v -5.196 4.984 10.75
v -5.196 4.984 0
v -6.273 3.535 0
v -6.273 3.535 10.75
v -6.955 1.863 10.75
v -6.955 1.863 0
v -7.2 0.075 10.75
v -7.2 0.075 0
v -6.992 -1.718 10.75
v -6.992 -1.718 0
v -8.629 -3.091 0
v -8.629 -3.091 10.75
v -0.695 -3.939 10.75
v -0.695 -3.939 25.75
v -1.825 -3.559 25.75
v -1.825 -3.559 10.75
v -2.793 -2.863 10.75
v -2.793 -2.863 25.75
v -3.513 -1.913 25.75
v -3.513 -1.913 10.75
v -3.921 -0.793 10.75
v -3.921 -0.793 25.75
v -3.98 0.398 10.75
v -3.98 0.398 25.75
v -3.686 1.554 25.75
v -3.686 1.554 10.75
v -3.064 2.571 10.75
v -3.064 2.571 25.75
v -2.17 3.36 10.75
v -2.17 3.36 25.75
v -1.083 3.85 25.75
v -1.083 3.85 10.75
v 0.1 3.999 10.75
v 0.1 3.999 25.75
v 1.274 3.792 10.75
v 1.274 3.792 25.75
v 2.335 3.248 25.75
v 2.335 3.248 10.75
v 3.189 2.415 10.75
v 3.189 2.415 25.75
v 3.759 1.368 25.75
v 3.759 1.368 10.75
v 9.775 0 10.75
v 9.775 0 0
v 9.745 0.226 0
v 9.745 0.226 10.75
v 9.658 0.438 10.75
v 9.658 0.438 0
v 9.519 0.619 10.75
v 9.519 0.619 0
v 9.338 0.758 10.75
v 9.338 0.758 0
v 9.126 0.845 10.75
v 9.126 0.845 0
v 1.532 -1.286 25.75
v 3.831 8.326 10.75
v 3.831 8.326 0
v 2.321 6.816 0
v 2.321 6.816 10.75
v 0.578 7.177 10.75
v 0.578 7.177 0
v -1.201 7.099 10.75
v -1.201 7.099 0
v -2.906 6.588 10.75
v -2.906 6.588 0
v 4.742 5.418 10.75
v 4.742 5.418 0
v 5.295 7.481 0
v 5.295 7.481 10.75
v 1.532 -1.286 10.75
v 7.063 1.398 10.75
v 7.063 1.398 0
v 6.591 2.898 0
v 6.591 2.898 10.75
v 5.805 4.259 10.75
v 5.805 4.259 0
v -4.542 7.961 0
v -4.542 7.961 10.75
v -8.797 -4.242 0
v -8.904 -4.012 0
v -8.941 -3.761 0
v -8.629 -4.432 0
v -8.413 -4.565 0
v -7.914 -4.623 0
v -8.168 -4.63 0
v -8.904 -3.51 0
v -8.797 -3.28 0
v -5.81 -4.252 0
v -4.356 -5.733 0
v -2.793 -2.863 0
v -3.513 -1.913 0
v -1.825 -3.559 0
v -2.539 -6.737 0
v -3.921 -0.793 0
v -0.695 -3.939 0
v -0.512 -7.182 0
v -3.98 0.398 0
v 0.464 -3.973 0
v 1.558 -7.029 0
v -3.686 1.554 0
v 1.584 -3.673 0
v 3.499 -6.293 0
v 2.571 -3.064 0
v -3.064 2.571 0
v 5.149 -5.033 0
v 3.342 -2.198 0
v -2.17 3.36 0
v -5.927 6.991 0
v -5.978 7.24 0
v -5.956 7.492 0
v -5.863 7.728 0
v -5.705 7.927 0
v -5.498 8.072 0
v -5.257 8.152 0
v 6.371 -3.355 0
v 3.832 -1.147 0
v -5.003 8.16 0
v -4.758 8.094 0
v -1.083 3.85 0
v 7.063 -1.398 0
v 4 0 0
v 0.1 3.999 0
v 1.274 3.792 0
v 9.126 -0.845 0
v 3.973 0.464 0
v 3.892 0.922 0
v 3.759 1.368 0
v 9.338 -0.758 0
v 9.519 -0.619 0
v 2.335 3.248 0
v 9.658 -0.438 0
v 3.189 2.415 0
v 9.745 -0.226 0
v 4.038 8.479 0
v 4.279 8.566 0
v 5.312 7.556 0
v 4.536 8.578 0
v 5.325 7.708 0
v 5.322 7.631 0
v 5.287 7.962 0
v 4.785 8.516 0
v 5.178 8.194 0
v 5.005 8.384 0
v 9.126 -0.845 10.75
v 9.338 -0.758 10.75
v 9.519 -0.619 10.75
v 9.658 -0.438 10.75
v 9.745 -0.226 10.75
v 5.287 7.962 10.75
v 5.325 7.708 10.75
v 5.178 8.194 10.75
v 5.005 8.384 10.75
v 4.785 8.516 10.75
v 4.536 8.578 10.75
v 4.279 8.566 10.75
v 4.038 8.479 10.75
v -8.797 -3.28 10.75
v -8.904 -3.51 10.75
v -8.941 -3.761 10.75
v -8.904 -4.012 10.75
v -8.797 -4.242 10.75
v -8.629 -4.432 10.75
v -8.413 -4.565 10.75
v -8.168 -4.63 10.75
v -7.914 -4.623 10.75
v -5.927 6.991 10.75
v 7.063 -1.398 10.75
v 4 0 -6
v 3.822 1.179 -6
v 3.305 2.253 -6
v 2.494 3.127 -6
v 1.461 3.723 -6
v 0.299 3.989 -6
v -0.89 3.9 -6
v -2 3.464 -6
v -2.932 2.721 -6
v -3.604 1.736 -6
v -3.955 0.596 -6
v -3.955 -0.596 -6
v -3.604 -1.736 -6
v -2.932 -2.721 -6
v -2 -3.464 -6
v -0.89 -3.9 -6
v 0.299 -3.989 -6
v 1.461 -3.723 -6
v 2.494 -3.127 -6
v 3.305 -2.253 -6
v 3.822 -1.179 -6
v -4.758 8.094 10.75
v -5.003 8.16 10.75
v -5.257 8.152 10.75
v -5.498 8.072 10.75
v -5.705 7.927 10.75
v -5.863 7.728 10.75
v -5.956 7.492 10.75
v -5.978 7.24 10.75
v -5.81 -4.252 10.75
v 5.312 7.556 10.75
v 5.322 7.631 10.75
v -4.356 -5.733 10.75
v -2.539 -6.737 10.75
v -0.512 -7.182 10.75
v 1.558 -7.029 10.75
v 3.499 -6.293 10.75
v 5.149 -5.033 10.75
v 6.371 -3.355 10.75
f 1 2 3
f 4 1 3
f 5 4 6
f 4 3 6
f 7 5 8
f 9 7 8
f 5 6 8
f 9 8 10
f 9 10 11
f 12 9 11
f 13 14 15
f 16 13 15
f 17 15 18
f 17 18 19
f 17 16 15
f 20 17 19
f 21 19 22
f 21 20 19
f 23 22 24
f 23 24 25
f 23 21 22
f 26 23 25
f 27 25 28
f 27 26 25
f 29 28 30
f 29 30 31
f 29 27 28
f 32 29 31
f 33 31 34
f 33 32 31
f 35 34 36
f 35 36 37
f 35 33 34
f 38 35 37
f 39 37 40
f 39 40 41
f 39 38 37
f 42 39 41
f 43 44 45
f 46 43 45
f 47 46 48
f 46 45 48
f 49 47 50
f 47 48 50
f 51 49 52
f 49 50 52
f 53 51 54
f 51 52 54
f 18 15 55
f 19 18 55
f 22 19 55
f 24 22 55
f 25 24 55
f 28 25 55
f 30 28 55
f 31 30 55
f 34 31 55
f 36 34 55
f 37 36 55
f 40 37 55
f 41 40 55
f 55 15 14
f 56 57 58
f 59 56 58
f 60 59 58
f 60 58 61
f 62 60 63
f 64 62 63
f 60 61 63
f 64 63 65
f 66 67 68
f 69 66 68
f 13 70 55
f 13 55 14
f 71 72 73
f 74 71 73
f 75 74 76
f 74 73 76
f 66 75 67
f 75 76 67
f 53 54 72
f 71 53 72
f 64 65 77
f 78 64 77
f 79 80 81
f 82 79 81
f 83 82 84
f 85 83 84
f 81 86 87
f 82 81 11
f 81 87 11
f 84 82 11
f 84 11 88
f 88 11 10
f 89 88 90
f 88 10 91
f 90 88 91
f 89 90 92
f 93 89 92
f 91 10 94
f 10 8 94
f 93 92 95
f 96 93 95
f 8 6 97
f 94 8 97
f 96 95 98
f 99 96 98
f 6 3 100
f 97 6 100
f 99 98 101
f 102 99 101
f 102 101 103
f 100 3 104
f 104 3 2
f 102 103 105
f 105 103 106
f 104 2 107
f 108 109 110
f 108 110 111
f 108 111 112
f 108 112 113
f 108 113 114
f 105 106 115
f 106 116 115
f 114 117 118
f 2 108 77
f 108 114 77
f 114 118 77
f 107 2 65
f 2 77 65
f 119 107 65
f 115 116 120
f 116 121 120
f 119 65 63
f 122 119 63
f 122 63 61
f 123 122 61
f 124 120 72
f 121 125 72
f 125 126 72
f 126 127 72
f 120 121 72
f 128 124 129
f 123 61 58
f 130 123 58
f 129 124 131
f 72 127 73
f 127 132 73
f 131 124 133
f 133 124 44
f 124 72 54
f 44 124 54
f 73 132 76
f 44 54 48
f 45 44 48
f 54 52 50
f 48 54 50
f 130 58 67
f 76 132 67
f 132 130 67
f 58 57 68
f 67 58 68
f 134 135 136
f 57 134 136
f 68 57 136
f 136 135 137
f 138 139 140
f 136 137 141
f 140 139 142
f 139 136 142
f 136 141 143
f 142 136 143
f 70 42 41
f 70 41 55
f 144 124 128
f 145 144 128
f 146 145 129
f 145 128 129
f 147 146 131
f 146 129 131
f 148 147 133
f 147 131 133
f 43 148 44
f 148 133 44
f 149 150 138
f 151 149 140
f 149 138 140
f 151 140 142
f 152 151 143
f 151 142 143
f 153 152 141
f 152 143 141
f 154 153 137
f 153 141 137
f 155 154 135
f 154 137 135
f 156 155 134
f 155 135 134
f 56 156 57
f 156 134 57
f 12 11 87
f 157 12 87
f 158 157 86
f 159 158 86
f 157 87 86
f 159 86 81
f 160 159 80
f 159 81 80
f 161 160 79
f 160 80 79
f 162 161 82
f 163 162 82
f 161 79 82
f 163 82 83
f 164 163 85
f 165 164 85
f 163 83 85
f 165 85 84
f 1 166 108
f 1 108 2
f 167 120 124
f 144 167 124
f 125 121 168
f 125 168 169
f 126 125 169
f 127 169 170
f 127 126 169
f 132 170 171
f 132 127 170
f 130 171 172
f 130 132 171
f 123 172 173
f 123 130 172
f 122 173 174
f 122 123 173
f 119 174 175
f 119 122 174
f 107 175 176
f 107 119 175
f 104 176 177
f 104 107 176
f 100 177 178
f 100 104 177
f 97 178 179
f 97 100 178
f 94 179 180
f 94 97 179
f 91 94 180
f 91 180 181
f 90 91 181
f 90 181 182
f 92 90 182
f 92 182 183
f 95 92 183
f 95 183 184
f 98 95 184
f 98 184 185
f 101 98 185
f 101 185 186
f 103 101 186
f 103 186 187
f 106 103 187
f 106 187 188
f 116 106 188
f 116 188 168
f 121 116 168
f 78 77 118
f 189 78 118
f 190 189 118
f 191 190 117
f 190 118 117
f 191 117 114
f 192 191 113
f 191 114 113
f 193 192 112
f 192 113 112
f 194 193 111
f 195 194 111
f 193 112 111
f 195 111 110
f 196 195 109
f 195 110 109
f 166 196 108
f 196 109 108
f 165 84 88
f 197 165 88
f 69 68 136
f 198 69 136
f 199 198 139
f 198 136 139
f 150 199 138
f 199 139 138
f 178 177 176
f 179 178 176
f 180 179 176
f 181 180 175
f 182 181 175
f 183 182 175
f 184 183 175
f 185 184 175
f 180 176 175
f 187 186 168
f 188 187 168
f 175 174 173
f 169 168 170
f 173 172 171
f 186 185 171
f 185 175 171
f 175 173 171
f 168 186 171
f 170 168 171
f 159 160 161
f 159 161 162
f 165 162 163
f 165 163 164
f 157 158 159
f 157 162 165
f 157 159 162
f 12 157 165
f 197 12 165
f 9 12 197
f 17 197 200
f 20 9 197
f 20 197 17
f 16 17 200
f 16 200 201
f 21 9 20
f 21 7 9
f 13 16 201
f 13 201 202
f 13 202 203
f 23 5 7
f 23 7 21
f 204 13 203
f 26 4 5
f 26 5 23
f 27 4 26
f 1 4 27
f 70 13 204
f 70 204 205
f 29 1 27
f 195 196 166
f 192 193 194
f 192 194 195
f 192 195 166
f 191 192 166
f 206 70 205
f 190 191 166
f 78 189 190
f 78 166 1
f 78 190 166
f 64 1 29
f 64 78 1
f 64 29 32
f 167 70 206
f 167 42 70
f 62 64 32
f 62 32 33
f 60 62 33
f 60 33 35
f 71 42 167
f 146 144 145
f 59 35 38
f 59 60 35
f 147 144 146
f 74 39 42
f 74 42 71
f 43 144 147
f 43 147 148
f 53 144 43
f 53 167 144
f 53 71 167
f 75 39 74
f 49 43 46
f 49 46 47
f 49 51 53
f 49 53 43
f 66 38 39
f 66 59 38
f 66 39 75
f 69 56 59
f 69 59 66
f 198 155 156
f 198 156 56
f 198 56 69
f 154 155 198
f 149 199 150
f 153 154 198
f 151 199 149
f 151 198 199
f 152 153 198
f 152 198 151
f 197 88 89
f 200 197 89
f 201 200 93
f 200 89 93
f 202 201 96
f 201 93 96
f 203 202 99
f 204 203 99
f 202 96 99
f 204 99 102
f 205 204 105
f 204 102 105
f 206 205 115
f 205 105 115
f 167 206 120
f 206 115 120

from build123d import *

# Parameters (mm, degrees)
F1_DEPTH = 10.75
F2_R     = 4
F3_DEPTH = 16.75
F5_DEPTH = 25.75


with BuildPart() as f1:
    # F0 (on Top) → F1 (new body)
    with BuildSketch(Plane.XY):
        with BuildLine():
            Line((0, 0), (7.2, 0))
            ThreePointArc((7.2, 0), (7.1656564529, 0.7024013095), (7.0629534446, 1.3981017988))
            ThreePointArc((7.0629534446, 1.3981017988), (6.2353829072, 3.6), (4.7422683972, 5.4176462093))
            ThreePointArc((4.7422683972, 5.4176462093), (4.1911256041, 5.8544398682), (3.6, 6.2353829072))
            Line((3.6, 6.2353829072), (0, 0))
        make_face()
        with BuildLine():
            Line((8.025, 0), (7.2, 0))
            ThreePointArc((7.2, 0), (7.1656564529, -0.7024013095), (7.0629534446, -1.3981017988))
            Line((7.0629534446, -1.3981017988), (9.1264666645, -0.845185098))
            ThreePointArc((9.1264666645, -0.845185098), (8.3673337496, -0.6941841728), (8.025, 0))
        make_face()
        with BuildLine():
            ThreePointArc((7.0629534446, -1.3981017988), (7.1656564529, -0.7024013095), (7.2, 0))
            Line((7.2, 0), (0, 0))
            Line((0, 0), (-6.5254160667, -3.0428514845))
            ThreePointArc((-6.5254160667, -3.0428514845), (-6.197442622, -3.6649290508), (-5.8103463543, -4.2520436549))
            ThreePointArc((-5.8103463543, -4.2520436549), (1.5583652204, -7.0293312513), (7.0629534446, -1.3981017988))
        make_face()
        with BuildLine():
            ThreePointArc((7.0629534446, 1.3981017988), (7.1656564529, 0.7024013095), (7.2, 0))
            Line((7.2, 0), (8.025, 0))
            ThreePointArc((8.025, 0), (8.3673337496, 0.6941841728), (9.1264666645, 0.845185098))
            Line((9.1264666645, 0.845185098), (7.0629534446, 1.3981017988))
        make_face()
        with BuildLine():
            Line((-4.1297503417, 5.8978947189), (0, 0))
            Line((0, 0), (3.6, 6.2353829072))
            ThreePointArc((3.6, 6.2353829072), (2.9745308488, 6.5568411777), (2.3206850474, 6.8157480082))
            ThreePointArc((2.3206850474, 6.8157480082), (-0.314059589, 7.1931471954), (-2.9058857202, 6.5875510003))
            ThreePointArc((-2.9058857202, 6.5875510003), (-3.5346782238, 6.272642972), (-4.1297503417, 5.8978947189))
        make_face()
        with BuildLine():
            Line((-6.5254160667, -3.0428514845), (0, 0))
            Line((0, 0), (-4.1297503417, 5.8978947189))
            ThreePointArc((-4.1297503417, 5.8978947189), (-4.6854251609, 5.466881292), (-5.1964016135, 4.9837145054))
            ThreePointArc((-5.1964016135, 4.9837145054), (-6.9546659493, 1.8634971247), (-6.9920730582, -1.7178225601))
            ThreePointArc((-6.9920730582, -1.7178225601), (-6.7911378629, -2.3917454979), (-6.5254160667, -3.0428514845))
        make_face()
        with BuildLine():
            ThreePointArc((9.1264666645, 0.845185098), (8.3673337496, 0.6941841728), (8.025, 0))
            Line((8.025, 0), (8.9, 0))
            Line((8.9, 0), (9.1264666645, 0.845185098))
        make_face()
        with BuildLine():
            Line((8.9, 0), (8.025, 0))
            ThreePointArc((8.025, 0), (8.3673337496, -0.6941841728), (9.1264666645, -0.845185098))
            Line((9.1264666645, -0.845185098), (8.9, 0))
        make_face()
        with BuildLine():
            ThreePointArc((3.6, 6.2353829072), (4.1911256041, 5.8544398682), (4.7422683972, 5.4176462093))
            Line((4.7422683972, 5.4176462093), (5.295185098, 7.4811594292))
            ThreePointArc((5.295185098, 7.4811594292), (4.7848480033, 6.8992315027), (4.0125, 6.9498538654))
            Line((4.0125, 6.9498538654), (3.6, 6.2353829072))
        make_face()
        with BuildLine():
            ThreePointArc((9.775, 0), (9.5941841728, 0.5326662504), (9.1264666645, 0.845185098))
            Line((9.1264666645, 0.845185098), (8.9, 0))
            Line((8.9, 0), (9.1264666645, -0.845185098))
            ThreePointArc((9.1264666645, -0.845185098), (9.5941841728, -0.5326662504), (9.775, 0))
        make_face()
        with BuildLine():
            Line((-7.9141971492, -4.6230093134), (-5.8103463543, -4.2520436549))
            ThreePointArc((-5.8103463543, -4.2520436549), (-6.197442622, -3.6649290508), (-6.5254160667, -3.0428514845))
            Line((-6.5254160667, -3.0428514845), (-7.273119991, -3.3915115505))
            ThreePointArc((-7.273119991, -3.3915115505), (-7.2118802984, -3.5719178673), (-7.1911393046, -3.7613025295))
            ThreePointArc((-7.1911393046, -3.7613025295), (-7.3958504169, -4.323741688), (-7.9141971492, -4.6230093134))
        make_face()
        with BuildLine():
            Line((-7.273119991, -3.3915115505), (-6.5254160667, -3.0428514845))
            ThreePointArc((-6.5254160667, -3.0428514845), (-6.7911378629, -2.3917454979), (-6.9920730582, -1.7178225601))
            Line((-6.9920730582, -1.7178225601), (-8.6285784631, -3.0910136418))
            ThreePointArc((-8.6285784631, -3.0910136418), (-7.8767546424, -2.9070435233), (-7.273119991, -3.3915115505))
        make_face()
        with BuildLine():
            ThreePointArc((2.3206850474, 6.8157480082), (2.9745308488, 6.5568411777), (3.6, 6.2353829072))
            Line((3.6, 6.2353829072), (4.0125, 6.9498538654))
            ThreePointArc((4.0125, 6.9498538654), (3.5824857463, 7.5934156755), (3.8312815665, 8.3263445272))
            Line((3.8312815665, 8.3263445272), (2.3206850474, 6.8157480082))
        make_face()
        with BuildLine():
            Line((-4.6029509017, 6.5736951554), (-4.1297503417, 5.8978947189))
            ThreePointArc((-4.1297503417, 5.8978947189), (-3.5346782238, 6.272642972), (-2.9058857202, 6.5875510003))
            Line((-2.9058857202, 6.5875510003), (-4.542391125, 7.9607420819))
            ThreePointArc((-4.542391125, 7.9607420819), (-4.3118109699, 7.6602441732), (-4.2298302835, 7.2904531942))
            ThreePointArc((-4.2298302835, 7.2904531942), (-4.3286958045, 6.8864231576), (-4.6029509017, 6.5736951554))
        make_face()
        with BuildLine():
            ThreePointArc((-5.1964016135, 4.9837145054), (-4.6854251609, 5.466881292), (-4.1297503417, 5.8978947189))
            Line((-4.1297503417, 5.8978947189), (-4.6029509017, 6.5736951554))
            ThreePointArc((-4.6029509017, 6.5736951554), (-5.3679478581, 6.4559508623), (-5.9270613267, 6.9911855688))
            Line((-5.9270613267, 6.9911855688), (-5.1964016135, 4.9837145054))
        make_face()
        with BuildLine():
            Line((4.45, 7.7076260937), (5.295185098, 7.4811594292))
            ThreePointArc((5.295185098, 7.4811594292), (5.3175142537, 7.5934156755), (5.325, 7.7076260937))
            ThreePointArc((5.325, 7.7076260937), (4.7848480033, 8.5160206846), (3.8312815665, 8.3263445272))
            Line((3.8312815665, 8.3263445272), (4.45, 7.7076260937))
        make_face()
        with BuildLine():
            ThreePointArc((4.0125, 6.9498538654), (4.7848480033, 6.8992315027), (5.295185098, 7.4811594292))
            Line((5.295185098, 7.4811594292), (4.45, 7.7076260937))
            Line((4.45, 7.7076260937), (4.0125, 6.9498538654))
        make_face()
        with BuildLine():
            ThreePointArc((-8.6285784631, -3.0910136418), (-8.8591586183, -4.1310935085), (-7.9141971492, -4.6230093134))
            ThreePointArc((-7.9141971492, -4.6230093134), (-7.3958504169, -4.323741688), (-7.1911393046, -3.7613025295))
            ThreePointArc((-7.1911393046, -3.7613025295), (-7.2118802984, -3.5719178673), (-7.273119991, -3.3915115505))
            ThreePointArc((-7.273119991, -3.3915115505), (-7.8767546424, -2.9070435233), (-8.6285784631, -3.0910136418))
        make_face()
        with BuildLine():
            ThreePointArc((3.8312815665, 8.3263445272), (3.5824857463, 7.5934156755), (4.0125, 6.9498538654))
            Line((4.0125, 6.9498538654), (4.45, 7.7076260937))
            Line((4.45, 7.7076260937), (3.8312815665, 8.3263445272))
        make_face()
        with BuildLine():
            ThreePointArc((-5.9270613267, 6.9911855688), (-5.3679478581, 6.4559508623), (-4.6029509017, 6.5736951554))
            ThreePointArc((-4.6029509017, 6.5736951554), (-4.3286958045, 6.8864231576), (-4.2298302835, 7.2904531942))
            ThreePointArc((-4.2298302835, 7.2904531942), (-4.3118109699, 7.6602441732), (-4.542391125, 7.9607420819))
            ThreePointArc((-4.542391125, 7.9607420819), (-5.6067096653, 8.0072112329), (-5.9270613267, 6.9911855688))
        make_face()
    extrude(amount=F1_DEPTH)

    # F2 (on face) → F3 (join)
    with BuildSketch(Plane.XY.offset(10.75)):
        Circle(F2_R)
    extrude(amount=-F3_DEPTH)

    # F4 (on face) → F5 (join)
    with BuildSketch(Plane(origin=(0, 0, 0), x_dir=(1, 0, 0), z_dir=(0, 0, -1))):
        with BuildLine():
            Line((1.5320888862, 1.2855752194), (-0.6945927107, 3.939231012))
            ThreePointArc((-0.6945927107, 3.939231012), (-3.0641777725, -2.5711504387), (3.7587704831, -1.3680805733))
            Line((3.7587704831, -1.3680805733), (1.5320888862, 1.2855752194))
        make_face()
    extrude(amount=-F5_DEPTH)


solid = f1.part
